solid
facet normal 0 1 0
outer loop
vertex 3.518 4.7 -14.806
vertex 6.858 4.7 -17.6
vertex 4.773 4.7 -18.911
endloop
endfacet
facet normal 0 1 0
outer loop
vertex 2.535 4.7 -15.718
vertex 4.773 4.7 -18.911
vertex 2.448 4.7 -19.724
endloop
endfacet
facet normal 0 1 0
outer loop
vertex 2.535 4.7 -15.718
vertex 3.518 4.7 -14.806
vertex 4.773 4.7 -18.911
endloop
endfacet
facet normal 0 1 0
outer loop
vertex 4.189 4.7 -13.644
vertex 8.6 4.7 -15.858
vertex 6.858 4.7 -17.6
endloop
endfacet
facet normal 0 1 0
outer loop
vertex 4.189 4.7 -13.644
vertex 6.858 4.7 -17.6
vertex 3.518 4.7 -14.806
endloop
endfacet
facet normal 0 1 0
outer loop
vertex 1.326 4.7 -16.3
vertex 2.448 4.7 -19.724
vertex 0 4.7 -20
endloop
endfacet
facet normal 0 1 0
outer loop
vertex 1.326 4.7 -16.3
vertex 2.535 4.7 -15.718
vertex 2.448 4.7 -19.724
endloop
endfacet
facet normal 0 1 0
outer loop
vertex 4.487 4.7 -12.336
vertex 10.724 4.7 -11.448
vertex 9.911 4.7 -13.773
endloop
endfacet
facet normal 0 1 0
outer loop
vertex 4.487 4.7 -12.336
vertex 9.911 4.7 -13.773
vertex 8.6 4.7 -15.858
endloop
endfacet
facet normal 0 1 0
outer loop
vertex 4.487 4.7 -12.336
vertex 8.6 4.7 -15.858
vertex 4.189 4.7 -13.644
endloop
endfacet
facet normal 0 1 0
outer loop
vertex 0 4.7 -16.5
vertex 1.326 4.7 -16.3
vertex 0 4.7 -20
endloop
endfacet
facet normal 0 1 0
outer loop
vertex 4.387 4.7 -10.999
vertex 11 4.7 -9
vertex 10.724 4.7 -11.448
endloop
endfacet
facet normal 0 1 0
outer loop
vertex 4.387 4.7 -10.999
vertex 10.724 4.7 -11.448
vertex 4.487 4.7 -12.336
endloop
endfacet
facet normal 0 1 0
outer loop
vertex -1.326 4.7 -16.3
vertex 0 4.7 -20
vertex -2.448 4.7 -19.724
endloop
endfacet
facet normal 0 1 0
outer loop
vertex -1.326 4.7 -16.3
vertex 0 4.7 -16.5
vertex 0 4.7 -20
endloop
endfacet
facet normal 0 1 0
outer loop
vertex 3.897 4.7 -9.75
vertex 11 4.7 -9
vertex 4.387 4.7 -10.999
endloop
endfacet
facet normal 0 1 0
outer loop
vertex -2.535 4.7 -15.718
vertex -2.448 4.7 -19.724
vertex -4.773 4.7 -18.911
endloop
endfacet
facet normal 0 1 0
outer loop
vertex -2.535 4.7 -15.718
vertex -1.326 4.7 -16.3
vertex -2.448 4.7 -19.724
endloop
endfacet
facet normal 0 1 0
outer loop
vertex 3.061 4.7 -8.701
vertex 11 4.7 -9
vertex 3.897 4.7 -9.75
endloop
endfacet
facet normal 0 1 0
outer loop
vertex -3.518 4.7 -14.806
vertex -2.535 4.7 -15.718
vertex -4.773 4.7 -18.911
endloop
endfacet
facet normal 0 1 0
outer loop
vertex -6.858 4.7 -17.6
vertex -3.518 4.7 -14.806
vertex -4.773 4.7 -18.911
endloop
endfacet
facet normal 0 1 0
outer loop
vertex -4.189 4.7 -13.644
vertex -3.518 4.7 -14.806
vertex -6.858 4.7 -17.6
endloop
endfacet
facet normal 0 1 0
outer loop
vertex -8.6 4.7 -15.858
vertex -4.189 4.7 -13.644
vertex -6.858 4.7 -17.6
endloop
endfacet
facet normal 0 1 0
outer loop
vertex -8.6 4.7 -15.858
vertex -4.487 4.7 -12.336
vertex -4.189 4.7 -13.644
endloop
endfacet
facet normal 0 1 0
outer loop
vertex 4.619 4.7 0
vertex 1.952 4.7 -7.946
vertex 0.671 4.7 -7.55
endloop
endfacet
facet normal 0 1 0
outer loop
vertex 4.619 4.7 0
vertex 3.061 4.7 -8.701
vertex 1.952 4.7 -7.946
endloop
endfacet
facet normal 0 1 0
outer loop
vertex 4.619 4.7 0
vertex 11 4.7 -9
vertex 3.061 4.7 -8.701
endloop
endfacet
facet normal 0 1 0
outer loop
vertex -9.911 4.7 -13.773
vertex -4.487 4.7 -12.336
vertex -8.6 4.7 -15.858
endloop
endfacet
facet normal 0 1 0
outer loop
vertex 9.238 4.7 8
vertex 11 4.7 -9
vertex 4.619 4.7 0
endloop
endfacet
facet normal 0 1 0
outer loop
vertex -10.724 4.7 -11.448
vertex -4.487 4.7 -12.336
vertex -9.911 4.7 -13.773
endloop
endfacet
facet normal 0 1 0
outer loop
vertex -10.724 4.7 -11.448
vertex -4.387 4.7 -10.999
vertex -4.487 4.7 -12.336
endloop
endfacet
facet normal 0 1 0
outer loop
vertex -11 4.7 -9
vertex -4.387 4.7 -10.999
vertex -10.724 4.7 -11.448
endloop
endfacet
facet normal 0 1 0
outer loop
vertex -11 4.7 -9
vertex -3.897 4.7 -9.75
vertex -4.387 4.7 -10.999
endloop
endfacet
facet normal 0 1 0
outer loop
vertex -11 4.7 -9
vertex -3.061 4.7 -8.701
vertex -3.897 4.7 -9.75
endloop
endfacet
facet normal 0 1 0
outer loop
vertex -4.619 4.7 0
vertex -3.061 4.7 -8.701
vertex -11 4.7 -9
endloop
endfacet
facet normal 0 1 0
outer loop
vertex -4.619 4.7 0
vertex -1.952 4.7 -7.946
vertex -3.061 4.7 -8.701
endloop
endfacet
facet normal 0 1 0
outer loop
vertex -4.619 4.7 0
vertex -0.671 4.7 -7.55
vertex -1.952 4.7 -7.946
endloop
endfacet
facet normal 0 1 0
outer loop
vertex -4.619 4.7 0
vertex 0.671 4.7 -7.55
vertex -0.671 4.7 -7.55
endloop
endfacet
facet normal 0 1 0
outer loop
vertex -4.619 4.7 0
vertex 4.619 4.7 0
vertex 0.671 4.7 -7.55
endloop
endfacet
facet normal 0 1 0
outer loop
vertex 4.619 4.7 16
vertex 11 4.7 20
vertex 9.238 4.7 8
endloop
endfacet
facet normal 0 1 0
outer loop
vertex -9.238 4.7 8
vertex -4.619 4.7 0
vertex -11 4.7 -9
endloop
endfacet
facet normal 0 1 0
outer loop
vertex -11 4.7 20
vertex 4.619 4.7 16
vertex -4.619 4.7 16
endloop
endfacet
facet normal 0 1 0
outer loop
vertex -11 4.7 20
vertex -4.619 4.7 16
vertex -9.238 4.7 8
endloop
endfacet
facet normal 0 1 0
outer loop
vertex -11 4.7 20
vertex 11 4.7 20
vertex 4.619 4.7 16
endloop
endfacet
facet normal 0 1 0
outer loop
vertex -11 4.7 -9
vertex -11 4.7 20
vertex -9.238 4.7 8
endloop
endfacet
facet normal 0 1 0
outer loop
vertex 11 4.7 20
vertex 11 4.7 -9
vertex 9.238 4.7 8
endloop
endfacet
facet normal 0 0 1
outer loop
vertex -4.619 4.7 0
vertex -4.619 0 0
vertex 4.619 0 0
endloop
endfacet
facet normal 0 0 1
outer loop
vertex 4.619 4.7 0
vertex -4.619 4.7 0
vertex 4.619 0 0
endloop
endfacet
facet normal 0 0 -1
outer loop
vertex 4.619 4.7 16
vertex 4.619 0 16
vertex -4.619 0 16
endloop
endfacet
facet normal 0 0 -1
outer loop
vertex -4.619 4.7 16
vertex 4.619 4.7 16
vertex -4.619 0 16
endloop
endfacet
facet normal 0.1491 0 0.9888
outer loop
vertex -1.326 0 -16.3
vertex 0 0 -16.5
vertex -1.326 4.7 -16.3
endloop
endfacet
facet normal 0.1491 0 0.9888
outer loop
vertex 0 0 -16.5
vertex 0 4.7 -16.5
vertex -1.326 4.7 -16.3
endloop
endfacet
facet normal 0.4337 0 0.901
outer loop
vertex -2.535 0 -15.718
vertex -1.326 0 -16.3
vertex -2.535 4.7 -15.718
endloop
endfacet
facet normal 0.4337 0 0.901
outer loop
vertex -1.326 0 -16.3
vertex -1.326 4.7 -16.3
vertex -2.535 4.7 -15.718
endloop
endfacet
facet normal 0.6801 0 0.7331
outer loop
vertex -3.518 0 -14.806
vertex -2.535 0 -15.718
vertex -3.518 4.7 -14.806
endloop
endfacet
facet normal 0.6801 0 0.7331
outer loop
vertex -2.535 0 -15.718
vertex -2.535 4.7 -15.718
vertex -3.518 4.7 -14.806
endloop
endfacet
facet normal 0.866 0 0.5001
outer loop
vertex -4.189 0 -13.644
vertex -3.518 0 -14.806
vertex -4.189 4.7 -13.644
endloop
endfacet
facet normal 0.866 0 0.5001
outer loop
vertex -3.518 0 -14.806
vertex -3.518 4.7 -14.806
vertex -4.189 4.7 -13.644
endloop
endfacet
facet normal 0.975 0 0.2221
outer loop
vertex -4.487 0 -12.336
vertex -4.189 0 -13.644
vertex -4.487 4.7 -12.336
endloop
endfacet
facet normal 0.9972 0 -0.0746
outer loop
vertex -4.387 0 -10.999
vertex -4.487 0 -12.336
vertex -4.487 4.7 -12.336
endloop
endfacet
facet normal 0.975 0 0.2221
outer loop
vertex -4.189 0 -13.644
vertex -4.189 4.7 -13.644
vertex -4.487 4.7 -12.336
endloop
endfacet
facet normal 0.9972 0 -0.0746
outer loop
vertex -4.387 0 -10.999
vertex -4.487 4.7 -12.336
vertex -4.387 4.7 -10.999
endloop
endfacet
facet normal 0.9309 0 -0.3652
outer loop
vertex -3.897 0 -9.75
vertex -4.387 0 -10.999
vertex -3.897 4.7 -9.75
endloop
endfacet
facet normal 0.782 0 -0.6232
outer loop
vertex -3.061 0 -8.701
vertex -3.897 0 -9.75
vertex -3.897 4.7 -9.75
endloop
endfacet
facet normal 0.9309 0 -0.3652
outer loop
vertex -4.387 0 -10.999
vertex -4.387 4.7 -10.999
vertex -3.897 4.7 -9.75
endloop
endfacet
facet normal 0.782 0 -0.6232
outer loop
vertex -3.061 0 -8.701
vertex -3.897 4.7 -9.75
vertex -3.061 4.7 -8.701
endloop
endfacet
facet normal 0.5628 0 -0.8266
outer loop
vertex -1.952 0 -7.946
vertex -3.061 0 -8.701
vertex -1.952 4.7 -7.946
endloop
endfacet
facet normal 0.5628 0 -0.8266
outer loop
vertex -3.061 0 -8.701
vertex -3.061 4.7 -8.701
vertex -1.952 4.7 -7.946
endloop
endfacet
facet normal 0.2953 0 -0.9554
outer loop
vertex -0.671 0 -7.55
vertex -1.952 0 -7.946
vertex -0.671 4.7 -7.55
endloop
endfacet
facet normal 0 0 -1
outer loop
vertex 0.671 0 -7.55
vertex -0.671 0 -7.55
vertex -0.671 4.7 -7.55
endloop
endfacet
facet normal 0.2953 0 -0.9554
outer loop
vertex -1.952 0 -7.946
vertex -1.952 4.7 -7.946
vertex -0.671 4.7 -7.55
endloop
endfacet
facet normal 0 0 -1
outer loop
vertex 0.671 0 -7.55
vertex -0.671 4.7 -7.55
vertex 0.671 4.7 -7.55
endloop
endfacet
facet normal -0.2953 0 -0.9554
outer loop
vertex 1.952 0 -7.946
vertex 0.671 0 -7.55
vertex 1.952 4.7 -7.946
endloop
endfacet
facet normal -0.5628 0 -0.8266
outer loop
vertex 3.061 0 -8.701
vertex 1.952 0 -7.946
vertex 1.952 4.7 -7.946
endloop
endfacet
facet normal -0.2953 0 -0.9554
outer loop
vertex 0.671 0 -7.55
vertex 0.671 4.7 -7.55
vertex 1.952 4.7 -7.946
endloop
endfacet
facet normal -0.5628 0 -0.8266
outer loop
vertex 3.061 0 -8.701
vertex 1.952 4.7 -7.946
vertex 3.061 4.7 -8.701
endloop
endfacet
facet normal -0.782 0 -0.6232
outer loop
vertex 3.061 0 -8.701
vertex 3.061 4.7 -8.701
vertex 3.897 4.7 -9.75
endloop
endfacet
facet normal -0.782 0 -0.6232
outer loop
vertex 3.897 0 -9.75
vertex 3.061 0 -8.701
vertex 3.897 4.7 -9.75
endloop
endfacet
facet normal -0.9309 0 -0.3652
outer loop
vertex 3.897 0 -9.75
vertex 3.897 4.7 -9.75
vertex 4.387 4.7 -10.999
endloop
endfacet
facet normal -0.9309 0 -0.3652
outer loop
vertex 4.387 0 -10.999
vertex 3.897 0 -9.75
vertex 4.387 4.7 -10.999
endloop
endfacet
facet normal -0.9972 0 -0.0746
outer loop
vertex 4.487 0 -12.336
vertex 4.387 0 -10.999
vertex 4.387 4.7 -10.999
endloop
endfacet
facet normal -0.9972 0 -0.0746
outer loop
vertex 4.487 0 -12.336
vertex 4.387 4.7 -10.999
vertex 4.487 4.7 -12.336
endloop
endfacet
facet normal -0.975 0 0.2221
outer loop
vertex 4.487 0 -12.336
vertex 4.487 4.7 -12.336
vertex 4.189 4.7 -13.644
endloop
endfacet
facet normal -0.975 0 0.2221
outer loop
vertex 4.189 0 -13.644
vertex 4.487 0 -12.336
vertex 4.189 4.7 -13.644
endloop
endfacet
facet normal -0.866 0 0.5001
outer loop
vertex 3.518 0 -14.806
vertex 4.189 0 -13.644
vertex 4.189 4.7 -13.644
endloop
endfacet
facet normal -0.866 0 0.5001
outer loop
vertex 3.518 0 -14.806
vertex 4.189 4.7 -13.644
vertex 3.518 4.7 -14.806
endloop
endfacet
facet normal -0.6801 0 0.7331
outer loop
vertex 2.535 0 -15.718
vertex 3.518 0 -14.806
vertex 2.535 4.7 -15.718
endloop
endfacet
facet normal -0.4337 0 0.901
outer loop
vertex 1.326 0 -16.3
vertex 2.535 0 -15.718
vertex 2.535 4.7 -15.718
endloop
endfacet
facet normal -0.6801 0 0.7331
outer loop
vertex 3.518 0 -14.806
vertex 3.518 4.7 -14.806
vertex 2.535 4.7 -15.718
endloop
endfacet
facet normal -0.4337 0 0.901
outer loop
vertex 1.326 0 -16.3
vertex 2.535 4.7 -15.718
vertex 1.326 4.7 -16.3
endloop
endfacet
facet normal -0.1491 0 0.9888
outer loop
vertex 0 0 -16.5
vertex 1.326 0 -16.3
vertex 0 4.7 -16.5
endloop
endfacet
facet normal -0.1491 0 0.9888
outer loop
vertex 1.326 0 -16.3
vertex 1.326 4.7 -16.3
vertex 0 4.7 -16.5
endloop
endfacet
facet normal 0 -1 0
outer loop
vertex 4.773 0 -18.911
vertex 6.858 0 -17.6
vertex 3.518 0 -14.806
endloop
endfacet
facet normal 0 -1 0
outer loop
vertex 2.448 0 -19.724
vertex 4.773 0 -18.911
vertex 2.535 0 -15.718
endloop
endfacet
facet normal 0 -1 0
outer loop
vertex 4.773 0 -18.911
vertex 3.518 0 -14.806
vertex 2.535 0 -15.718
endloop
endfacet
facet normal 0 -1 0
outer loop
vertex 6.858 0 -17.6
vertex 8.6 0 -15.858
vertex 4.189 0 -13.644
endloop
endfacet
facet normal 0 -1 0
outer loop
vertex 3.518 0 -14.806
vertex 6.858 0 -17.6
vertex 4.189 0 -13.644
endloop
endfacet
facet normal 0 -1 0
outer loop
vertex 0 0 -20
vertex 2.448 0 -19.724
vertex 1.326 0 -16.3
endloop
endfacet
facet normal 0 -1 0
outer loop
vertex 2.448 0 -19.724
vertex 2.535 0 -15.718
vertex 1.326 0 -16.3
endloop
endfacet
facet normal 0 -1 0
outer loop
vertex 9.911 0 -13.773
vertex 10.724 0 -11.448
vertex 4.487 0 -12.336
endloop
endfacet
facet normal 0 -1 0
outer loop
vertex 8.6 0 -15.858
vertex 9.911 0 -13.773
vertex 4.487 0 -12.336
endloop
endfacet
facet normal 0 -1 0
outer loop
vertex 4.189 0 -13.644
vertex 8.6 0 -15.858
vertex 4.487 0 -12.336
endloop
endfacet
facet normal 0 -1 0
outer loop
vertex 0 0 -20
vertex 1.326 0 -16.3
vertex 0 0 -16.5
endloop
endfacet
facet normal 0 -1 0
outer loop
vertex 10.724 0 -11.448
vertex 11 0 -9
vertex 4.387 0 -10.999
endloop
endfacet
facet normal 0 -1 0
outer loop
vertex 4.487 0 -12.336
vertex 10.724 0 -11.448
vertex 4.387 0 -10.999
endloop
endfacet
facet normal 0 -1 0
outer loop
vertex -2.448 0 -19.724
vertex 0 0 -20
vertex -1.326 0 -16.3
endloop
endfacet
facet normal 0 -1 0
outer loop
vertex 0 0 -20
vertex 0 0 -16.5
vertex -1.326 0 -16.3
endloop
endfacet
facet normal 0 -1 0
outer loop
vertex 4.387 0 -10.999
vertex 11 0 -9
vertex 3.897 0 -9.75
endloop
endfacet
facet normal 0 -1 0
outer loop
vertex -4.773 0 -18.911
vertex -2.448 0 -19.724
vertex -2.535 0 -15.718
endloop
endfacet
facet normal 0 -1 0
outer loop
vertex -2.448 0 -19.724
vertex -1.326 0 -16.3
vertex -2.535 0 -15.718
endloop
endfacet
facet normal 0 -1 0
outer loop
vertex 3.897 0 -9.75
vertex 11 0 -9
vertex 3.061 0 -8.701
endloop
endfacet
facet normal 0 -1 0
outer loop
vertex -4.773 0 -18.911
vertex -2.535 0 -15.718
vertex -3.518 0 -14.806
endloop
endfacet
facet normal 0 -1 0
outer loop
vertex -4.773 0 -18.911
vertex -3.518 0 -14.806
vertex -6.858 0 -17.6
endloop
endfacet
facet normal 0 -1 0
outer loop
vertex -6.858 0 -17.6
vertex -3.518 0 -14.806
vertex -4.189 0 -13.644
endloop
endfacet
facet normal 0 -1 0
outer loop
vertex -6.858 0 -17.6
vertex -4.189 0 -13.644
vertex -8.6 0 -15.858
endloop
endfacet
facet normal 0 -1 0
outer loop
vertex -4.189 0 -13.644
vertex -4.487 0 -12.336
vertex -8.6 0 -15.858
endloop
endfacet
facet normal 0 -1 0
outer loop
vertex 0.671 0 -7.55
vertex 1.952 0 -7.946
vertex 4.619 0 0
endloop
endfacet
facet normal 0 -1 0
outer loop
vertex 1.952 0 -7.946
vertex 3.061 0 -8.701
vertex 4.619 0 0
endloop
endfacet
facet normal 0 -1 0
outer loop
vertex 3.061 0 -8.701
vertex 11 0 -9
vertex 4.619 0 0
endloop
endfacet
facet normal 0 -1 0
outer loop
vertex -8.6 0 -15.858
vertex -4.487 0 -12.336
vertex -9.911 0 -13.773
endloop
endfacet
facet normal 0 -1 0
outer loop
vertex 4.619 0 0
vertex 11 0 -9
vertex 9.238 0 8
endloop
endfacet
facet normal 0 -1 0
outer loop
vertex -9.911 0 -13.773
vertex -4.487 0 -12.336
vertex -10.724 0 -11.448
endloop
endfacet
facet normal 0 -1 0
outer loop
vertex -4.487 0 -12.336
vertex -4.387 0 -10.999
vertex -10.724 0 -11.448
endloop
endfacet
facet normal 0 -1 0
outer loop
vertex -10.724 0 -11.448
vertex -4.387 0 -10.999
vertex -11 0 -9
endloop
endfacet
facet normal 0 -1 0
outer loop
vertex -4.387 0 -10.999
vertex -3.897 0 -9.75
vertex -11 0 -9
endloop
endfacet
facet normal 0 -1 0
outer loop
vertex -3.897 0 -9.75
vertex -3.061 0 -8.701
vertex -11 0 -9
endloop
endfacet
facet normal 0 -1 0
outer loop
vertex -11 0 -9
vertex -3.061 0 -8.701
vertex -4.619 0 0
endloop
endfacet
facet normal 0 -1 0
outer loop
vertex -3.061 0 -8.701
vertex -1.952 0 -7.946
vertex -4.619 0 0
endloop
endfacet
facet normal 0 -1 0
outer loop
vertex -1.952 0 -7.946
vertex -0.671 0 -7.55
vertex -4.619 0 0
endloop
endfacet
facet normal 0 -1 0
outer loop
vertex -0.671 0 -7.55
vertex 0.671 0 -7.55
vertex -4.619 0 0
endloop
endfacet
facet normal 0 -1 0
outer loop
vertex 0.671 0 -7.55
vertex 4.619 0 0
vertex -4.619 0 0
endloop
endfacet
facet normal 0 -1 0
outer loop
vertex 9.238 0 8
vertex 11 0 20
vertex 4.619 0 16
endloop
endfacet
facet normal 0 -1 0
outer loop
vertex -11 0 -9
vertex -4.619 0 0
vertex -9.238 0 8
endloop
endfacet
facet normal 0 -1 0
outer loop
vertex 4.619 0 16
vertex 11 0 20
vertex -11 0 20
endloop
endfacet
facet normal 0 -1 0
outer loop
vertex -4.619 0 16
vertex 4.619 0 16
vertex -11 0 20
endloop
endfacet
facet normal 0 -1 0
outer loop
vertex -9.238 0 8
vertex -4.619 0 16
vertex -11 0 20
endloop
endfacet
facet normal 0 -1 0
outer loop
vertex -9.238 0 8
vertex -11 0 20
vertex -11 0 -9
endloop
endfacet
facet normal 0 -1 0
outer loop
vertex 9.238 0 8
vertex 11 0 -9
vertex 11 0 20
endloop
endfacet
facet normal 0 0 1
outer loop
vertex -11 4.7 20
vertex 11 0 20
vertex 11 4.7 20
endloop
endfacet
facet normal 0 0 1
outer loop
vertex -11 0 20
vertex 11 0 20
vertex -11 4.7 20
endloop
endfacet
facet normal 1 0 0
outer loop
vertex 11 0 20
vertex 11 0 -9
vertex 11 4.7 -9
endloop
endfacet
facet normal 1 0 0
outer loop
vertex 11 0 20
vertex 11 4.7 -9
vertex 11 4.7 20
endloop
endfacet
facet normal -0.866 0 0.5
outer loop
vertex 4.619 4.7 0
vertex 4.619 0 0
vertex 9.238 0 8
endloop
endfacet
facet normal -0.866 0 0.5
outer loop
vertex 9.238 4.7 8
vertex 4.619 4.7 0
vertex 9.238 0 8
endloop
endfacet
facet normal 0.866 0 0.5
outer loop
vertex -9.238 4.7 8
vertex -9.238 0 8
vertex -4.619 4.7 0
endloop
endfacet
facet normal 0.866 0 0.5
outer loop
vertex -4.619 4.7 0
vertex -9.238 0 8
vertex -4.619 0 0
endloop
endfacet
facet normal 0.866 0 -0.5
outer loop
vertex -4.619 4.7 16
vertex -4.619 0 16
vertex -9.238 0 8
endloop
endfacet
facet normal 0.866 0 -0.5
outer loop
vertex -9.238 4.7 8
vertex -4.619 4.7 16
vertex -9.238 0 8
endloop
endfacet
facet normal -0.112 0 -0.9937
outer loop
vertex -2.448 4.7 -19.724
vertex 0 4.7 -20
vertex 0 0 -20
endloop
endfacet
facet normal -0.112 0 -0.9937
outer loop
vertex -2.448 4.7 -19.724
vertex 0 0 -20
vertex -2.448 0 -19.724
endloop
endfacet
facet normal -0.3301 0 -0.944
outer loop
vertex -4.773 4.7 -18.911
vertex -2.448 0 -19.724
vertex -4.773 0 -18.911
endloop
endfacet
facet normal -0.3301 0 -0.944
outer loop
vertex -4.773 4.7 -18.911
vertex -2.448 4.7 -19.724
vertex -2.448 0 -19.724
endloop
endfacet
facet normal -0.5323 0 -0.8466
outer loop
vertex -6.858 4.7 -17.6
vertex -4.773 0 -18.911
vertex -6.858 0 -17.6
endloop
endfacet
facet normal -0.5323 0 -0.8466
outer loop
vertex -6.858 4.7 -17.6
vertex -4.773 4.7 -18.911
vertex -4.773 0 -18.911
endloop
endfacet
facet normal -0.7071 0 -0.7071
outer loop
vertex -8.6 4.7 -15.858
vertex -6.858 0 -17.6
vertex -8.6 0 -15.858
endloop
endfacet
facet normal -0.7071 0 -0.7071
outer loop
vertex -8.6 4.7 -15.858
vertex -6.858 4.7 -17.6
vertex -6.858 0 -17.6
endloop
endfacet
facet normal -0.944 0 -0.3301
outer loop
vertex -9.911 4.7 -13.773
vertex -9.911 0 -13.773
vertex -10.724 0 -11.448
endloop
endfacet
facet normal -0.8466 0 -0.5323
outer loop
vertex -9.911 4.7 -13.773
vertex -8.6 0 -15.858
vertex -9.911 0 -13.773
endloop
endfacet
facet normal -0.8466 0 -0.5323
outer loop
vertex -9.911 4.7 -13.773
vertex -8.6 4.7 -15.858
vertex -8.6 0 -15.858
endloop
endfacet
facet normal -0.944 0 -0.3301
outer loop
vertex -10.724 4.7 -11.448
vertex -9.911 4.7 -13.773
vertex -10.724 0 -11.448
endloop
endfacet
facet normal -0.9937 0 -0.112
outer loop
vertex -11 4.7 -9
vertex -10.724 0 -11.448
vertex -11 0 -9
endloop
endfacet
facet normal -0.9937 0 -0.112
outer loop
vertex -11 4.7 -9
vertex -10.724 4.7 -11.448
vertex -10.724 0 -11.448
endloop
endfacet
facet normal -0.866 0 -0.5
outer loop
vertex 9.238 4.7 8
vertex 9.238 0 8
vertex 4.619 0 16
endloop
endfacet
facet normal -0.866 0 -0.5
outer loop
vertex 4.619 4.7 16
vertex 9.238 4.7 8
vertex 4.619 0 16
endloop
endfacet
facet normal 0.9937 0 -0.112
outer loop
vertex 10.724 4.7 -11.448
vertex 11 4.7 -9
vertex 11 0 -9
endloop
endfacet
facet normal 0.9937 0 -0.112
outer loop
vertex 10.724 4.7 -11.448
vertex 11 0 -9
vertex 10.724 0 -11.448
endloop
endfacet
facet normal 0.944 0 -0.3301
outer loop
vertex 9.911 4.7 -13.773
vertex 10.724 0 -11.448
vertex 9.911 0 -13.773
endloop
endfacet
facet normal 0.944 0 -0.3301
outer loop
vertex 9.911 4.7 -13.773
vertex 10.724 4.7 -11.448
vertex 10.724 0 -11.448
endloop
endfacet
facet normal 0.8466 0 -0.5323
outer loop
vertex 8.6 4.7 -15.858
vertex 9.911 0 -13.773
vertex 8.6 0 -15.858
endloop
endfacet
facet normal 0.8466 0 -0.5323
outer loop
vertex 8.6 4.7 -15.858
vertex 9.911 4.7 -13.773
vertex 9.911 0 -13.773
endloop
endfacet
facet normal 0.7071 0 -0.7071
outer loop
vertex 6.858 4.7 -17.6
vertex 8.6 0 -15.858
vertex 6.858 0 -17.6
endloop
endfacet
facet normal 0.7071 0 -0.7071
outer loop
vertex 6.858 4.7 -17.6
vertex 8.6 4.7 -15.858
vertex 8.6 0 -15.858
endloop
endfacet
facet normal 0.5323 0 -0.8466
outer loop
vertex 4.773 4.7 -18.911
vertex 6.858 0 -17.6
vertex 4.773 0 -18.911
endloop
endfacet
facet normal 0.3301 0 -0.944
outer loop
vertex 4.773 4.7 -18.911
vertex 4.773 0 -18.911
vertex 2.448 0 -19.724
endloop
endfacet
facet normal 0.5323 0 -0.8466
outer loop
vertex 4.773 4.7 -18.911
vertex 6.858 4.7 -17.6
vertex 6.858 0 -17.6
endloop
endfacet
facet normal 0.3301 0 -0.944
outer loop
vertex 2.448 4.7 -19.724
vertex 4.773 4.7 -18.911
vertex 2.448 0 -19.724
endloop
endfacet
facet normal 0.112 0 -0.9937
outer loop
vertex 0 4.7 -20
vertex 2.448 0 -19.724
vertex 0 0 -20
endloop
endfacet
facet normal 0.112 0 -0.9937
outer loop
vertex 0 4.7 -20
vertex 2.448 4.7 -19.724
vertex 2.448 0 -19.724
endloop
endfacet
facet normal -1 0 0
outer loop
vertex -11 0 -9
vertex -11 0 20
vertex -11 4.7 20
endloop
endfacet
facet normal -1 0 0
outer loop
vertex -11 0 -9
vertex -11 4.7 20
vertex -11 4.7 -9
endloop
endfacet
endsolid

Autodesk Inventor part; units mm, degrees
ref_plane "YZ Plane" through (0, 0, 0) normal (1, 0, 0) x (0, 1, 0)
ref_plane "XZ Plane" through (0, 0, 0) normal (0, 1, 0) x (-1, 0, 0)
ref_plane "XY Plane" through (0, 0, 0) normal (0, 0, 1) x (1, 0, 0)
sketch "Sketch1" plane through (0, 0, 0) normal (0, 1, 0) x (-1, 0, 0)
  line L0 (-11, 20) -> (11, 20)
  line L1 (11, 20) -> (11, -20)
  line L2 (11, -20) -> (-11, -20)
  line L3 (-11, -20) -> (-11, 20)
  line L4 (-11, 20) -> (11, -20) construction
  line L5 (11, 20) -> (-11, -20) construction
  line L6 (-11, -20) -> (-11, -12)
  line L7 (-11, 20) -> (-11, 9)
  line L8 (0, -20) -> (0, -12)
  line L9 (0, 20) -> (0, 8)
  line L10 (-4.6188, 0) -> (-9.2376, 8)
  line L11 (-9.2376, 8) -> (-4.6188, 16)
  line L12 (-4.6188, 16) -> (4.6188, 16)
  line L13 (4.6188, 16) -> (9.2376, 8)
  line L14 (9.2376, 8) -> (4.6188, 0)
  line L15 (4.6188, 0) -> (-4.6188, 0)
  dimension "d0" = 22
  dimension "d1" = 40
  dimension "d35" = 12
  dimension "d36" = 16
extrude "Plate1" add sketch "Sketch1" along normal blind 4.7 contours L0 L1 L2 L3 | L10 L11 L12 L13 L14 L15
hole "Hole4" at (0, 0, -12) direction (0, 1, 0) diameter 9 end through all clearance for "Countersunk Flat Head Screw ISO 2009/7046" size "M8" standard "ISO"
full round fillet "Fillet2" first side at (11, 1.5667, 6.6667) centre faces at (3.6667, 3.1333, -20) second side at (-11, 1.5667, -6.6667)
extrude "Cut1" cut sketch "Sketch1" along normal blind 4.7 contours L10 L11 L12 L13 L14 L15
equation "\"d31\" = Thickness"
equation "\"d37\" = Thickness"
equation "\"d3\" = Thickness"
equation "\"BendRadius\" = Thickness"
equation "\"BendReliefWidth\" = Thickness"
equation "\"BendReliefDepth\" = 0.5 * Thickness"
equation "\"CornerReliefSize\" = 4 * Thickness"
equation "\"MinimumRemnant\" = 2 * Thickness"
equation "\"TransitionRadius\" = BendRadius"
equation "\"JacobiRadiusSize\" = BendRadius"
equation "\"GapSize\" = Thickness"
equation "\"Thickness\" = 4.7"
properties part number "chapa"
